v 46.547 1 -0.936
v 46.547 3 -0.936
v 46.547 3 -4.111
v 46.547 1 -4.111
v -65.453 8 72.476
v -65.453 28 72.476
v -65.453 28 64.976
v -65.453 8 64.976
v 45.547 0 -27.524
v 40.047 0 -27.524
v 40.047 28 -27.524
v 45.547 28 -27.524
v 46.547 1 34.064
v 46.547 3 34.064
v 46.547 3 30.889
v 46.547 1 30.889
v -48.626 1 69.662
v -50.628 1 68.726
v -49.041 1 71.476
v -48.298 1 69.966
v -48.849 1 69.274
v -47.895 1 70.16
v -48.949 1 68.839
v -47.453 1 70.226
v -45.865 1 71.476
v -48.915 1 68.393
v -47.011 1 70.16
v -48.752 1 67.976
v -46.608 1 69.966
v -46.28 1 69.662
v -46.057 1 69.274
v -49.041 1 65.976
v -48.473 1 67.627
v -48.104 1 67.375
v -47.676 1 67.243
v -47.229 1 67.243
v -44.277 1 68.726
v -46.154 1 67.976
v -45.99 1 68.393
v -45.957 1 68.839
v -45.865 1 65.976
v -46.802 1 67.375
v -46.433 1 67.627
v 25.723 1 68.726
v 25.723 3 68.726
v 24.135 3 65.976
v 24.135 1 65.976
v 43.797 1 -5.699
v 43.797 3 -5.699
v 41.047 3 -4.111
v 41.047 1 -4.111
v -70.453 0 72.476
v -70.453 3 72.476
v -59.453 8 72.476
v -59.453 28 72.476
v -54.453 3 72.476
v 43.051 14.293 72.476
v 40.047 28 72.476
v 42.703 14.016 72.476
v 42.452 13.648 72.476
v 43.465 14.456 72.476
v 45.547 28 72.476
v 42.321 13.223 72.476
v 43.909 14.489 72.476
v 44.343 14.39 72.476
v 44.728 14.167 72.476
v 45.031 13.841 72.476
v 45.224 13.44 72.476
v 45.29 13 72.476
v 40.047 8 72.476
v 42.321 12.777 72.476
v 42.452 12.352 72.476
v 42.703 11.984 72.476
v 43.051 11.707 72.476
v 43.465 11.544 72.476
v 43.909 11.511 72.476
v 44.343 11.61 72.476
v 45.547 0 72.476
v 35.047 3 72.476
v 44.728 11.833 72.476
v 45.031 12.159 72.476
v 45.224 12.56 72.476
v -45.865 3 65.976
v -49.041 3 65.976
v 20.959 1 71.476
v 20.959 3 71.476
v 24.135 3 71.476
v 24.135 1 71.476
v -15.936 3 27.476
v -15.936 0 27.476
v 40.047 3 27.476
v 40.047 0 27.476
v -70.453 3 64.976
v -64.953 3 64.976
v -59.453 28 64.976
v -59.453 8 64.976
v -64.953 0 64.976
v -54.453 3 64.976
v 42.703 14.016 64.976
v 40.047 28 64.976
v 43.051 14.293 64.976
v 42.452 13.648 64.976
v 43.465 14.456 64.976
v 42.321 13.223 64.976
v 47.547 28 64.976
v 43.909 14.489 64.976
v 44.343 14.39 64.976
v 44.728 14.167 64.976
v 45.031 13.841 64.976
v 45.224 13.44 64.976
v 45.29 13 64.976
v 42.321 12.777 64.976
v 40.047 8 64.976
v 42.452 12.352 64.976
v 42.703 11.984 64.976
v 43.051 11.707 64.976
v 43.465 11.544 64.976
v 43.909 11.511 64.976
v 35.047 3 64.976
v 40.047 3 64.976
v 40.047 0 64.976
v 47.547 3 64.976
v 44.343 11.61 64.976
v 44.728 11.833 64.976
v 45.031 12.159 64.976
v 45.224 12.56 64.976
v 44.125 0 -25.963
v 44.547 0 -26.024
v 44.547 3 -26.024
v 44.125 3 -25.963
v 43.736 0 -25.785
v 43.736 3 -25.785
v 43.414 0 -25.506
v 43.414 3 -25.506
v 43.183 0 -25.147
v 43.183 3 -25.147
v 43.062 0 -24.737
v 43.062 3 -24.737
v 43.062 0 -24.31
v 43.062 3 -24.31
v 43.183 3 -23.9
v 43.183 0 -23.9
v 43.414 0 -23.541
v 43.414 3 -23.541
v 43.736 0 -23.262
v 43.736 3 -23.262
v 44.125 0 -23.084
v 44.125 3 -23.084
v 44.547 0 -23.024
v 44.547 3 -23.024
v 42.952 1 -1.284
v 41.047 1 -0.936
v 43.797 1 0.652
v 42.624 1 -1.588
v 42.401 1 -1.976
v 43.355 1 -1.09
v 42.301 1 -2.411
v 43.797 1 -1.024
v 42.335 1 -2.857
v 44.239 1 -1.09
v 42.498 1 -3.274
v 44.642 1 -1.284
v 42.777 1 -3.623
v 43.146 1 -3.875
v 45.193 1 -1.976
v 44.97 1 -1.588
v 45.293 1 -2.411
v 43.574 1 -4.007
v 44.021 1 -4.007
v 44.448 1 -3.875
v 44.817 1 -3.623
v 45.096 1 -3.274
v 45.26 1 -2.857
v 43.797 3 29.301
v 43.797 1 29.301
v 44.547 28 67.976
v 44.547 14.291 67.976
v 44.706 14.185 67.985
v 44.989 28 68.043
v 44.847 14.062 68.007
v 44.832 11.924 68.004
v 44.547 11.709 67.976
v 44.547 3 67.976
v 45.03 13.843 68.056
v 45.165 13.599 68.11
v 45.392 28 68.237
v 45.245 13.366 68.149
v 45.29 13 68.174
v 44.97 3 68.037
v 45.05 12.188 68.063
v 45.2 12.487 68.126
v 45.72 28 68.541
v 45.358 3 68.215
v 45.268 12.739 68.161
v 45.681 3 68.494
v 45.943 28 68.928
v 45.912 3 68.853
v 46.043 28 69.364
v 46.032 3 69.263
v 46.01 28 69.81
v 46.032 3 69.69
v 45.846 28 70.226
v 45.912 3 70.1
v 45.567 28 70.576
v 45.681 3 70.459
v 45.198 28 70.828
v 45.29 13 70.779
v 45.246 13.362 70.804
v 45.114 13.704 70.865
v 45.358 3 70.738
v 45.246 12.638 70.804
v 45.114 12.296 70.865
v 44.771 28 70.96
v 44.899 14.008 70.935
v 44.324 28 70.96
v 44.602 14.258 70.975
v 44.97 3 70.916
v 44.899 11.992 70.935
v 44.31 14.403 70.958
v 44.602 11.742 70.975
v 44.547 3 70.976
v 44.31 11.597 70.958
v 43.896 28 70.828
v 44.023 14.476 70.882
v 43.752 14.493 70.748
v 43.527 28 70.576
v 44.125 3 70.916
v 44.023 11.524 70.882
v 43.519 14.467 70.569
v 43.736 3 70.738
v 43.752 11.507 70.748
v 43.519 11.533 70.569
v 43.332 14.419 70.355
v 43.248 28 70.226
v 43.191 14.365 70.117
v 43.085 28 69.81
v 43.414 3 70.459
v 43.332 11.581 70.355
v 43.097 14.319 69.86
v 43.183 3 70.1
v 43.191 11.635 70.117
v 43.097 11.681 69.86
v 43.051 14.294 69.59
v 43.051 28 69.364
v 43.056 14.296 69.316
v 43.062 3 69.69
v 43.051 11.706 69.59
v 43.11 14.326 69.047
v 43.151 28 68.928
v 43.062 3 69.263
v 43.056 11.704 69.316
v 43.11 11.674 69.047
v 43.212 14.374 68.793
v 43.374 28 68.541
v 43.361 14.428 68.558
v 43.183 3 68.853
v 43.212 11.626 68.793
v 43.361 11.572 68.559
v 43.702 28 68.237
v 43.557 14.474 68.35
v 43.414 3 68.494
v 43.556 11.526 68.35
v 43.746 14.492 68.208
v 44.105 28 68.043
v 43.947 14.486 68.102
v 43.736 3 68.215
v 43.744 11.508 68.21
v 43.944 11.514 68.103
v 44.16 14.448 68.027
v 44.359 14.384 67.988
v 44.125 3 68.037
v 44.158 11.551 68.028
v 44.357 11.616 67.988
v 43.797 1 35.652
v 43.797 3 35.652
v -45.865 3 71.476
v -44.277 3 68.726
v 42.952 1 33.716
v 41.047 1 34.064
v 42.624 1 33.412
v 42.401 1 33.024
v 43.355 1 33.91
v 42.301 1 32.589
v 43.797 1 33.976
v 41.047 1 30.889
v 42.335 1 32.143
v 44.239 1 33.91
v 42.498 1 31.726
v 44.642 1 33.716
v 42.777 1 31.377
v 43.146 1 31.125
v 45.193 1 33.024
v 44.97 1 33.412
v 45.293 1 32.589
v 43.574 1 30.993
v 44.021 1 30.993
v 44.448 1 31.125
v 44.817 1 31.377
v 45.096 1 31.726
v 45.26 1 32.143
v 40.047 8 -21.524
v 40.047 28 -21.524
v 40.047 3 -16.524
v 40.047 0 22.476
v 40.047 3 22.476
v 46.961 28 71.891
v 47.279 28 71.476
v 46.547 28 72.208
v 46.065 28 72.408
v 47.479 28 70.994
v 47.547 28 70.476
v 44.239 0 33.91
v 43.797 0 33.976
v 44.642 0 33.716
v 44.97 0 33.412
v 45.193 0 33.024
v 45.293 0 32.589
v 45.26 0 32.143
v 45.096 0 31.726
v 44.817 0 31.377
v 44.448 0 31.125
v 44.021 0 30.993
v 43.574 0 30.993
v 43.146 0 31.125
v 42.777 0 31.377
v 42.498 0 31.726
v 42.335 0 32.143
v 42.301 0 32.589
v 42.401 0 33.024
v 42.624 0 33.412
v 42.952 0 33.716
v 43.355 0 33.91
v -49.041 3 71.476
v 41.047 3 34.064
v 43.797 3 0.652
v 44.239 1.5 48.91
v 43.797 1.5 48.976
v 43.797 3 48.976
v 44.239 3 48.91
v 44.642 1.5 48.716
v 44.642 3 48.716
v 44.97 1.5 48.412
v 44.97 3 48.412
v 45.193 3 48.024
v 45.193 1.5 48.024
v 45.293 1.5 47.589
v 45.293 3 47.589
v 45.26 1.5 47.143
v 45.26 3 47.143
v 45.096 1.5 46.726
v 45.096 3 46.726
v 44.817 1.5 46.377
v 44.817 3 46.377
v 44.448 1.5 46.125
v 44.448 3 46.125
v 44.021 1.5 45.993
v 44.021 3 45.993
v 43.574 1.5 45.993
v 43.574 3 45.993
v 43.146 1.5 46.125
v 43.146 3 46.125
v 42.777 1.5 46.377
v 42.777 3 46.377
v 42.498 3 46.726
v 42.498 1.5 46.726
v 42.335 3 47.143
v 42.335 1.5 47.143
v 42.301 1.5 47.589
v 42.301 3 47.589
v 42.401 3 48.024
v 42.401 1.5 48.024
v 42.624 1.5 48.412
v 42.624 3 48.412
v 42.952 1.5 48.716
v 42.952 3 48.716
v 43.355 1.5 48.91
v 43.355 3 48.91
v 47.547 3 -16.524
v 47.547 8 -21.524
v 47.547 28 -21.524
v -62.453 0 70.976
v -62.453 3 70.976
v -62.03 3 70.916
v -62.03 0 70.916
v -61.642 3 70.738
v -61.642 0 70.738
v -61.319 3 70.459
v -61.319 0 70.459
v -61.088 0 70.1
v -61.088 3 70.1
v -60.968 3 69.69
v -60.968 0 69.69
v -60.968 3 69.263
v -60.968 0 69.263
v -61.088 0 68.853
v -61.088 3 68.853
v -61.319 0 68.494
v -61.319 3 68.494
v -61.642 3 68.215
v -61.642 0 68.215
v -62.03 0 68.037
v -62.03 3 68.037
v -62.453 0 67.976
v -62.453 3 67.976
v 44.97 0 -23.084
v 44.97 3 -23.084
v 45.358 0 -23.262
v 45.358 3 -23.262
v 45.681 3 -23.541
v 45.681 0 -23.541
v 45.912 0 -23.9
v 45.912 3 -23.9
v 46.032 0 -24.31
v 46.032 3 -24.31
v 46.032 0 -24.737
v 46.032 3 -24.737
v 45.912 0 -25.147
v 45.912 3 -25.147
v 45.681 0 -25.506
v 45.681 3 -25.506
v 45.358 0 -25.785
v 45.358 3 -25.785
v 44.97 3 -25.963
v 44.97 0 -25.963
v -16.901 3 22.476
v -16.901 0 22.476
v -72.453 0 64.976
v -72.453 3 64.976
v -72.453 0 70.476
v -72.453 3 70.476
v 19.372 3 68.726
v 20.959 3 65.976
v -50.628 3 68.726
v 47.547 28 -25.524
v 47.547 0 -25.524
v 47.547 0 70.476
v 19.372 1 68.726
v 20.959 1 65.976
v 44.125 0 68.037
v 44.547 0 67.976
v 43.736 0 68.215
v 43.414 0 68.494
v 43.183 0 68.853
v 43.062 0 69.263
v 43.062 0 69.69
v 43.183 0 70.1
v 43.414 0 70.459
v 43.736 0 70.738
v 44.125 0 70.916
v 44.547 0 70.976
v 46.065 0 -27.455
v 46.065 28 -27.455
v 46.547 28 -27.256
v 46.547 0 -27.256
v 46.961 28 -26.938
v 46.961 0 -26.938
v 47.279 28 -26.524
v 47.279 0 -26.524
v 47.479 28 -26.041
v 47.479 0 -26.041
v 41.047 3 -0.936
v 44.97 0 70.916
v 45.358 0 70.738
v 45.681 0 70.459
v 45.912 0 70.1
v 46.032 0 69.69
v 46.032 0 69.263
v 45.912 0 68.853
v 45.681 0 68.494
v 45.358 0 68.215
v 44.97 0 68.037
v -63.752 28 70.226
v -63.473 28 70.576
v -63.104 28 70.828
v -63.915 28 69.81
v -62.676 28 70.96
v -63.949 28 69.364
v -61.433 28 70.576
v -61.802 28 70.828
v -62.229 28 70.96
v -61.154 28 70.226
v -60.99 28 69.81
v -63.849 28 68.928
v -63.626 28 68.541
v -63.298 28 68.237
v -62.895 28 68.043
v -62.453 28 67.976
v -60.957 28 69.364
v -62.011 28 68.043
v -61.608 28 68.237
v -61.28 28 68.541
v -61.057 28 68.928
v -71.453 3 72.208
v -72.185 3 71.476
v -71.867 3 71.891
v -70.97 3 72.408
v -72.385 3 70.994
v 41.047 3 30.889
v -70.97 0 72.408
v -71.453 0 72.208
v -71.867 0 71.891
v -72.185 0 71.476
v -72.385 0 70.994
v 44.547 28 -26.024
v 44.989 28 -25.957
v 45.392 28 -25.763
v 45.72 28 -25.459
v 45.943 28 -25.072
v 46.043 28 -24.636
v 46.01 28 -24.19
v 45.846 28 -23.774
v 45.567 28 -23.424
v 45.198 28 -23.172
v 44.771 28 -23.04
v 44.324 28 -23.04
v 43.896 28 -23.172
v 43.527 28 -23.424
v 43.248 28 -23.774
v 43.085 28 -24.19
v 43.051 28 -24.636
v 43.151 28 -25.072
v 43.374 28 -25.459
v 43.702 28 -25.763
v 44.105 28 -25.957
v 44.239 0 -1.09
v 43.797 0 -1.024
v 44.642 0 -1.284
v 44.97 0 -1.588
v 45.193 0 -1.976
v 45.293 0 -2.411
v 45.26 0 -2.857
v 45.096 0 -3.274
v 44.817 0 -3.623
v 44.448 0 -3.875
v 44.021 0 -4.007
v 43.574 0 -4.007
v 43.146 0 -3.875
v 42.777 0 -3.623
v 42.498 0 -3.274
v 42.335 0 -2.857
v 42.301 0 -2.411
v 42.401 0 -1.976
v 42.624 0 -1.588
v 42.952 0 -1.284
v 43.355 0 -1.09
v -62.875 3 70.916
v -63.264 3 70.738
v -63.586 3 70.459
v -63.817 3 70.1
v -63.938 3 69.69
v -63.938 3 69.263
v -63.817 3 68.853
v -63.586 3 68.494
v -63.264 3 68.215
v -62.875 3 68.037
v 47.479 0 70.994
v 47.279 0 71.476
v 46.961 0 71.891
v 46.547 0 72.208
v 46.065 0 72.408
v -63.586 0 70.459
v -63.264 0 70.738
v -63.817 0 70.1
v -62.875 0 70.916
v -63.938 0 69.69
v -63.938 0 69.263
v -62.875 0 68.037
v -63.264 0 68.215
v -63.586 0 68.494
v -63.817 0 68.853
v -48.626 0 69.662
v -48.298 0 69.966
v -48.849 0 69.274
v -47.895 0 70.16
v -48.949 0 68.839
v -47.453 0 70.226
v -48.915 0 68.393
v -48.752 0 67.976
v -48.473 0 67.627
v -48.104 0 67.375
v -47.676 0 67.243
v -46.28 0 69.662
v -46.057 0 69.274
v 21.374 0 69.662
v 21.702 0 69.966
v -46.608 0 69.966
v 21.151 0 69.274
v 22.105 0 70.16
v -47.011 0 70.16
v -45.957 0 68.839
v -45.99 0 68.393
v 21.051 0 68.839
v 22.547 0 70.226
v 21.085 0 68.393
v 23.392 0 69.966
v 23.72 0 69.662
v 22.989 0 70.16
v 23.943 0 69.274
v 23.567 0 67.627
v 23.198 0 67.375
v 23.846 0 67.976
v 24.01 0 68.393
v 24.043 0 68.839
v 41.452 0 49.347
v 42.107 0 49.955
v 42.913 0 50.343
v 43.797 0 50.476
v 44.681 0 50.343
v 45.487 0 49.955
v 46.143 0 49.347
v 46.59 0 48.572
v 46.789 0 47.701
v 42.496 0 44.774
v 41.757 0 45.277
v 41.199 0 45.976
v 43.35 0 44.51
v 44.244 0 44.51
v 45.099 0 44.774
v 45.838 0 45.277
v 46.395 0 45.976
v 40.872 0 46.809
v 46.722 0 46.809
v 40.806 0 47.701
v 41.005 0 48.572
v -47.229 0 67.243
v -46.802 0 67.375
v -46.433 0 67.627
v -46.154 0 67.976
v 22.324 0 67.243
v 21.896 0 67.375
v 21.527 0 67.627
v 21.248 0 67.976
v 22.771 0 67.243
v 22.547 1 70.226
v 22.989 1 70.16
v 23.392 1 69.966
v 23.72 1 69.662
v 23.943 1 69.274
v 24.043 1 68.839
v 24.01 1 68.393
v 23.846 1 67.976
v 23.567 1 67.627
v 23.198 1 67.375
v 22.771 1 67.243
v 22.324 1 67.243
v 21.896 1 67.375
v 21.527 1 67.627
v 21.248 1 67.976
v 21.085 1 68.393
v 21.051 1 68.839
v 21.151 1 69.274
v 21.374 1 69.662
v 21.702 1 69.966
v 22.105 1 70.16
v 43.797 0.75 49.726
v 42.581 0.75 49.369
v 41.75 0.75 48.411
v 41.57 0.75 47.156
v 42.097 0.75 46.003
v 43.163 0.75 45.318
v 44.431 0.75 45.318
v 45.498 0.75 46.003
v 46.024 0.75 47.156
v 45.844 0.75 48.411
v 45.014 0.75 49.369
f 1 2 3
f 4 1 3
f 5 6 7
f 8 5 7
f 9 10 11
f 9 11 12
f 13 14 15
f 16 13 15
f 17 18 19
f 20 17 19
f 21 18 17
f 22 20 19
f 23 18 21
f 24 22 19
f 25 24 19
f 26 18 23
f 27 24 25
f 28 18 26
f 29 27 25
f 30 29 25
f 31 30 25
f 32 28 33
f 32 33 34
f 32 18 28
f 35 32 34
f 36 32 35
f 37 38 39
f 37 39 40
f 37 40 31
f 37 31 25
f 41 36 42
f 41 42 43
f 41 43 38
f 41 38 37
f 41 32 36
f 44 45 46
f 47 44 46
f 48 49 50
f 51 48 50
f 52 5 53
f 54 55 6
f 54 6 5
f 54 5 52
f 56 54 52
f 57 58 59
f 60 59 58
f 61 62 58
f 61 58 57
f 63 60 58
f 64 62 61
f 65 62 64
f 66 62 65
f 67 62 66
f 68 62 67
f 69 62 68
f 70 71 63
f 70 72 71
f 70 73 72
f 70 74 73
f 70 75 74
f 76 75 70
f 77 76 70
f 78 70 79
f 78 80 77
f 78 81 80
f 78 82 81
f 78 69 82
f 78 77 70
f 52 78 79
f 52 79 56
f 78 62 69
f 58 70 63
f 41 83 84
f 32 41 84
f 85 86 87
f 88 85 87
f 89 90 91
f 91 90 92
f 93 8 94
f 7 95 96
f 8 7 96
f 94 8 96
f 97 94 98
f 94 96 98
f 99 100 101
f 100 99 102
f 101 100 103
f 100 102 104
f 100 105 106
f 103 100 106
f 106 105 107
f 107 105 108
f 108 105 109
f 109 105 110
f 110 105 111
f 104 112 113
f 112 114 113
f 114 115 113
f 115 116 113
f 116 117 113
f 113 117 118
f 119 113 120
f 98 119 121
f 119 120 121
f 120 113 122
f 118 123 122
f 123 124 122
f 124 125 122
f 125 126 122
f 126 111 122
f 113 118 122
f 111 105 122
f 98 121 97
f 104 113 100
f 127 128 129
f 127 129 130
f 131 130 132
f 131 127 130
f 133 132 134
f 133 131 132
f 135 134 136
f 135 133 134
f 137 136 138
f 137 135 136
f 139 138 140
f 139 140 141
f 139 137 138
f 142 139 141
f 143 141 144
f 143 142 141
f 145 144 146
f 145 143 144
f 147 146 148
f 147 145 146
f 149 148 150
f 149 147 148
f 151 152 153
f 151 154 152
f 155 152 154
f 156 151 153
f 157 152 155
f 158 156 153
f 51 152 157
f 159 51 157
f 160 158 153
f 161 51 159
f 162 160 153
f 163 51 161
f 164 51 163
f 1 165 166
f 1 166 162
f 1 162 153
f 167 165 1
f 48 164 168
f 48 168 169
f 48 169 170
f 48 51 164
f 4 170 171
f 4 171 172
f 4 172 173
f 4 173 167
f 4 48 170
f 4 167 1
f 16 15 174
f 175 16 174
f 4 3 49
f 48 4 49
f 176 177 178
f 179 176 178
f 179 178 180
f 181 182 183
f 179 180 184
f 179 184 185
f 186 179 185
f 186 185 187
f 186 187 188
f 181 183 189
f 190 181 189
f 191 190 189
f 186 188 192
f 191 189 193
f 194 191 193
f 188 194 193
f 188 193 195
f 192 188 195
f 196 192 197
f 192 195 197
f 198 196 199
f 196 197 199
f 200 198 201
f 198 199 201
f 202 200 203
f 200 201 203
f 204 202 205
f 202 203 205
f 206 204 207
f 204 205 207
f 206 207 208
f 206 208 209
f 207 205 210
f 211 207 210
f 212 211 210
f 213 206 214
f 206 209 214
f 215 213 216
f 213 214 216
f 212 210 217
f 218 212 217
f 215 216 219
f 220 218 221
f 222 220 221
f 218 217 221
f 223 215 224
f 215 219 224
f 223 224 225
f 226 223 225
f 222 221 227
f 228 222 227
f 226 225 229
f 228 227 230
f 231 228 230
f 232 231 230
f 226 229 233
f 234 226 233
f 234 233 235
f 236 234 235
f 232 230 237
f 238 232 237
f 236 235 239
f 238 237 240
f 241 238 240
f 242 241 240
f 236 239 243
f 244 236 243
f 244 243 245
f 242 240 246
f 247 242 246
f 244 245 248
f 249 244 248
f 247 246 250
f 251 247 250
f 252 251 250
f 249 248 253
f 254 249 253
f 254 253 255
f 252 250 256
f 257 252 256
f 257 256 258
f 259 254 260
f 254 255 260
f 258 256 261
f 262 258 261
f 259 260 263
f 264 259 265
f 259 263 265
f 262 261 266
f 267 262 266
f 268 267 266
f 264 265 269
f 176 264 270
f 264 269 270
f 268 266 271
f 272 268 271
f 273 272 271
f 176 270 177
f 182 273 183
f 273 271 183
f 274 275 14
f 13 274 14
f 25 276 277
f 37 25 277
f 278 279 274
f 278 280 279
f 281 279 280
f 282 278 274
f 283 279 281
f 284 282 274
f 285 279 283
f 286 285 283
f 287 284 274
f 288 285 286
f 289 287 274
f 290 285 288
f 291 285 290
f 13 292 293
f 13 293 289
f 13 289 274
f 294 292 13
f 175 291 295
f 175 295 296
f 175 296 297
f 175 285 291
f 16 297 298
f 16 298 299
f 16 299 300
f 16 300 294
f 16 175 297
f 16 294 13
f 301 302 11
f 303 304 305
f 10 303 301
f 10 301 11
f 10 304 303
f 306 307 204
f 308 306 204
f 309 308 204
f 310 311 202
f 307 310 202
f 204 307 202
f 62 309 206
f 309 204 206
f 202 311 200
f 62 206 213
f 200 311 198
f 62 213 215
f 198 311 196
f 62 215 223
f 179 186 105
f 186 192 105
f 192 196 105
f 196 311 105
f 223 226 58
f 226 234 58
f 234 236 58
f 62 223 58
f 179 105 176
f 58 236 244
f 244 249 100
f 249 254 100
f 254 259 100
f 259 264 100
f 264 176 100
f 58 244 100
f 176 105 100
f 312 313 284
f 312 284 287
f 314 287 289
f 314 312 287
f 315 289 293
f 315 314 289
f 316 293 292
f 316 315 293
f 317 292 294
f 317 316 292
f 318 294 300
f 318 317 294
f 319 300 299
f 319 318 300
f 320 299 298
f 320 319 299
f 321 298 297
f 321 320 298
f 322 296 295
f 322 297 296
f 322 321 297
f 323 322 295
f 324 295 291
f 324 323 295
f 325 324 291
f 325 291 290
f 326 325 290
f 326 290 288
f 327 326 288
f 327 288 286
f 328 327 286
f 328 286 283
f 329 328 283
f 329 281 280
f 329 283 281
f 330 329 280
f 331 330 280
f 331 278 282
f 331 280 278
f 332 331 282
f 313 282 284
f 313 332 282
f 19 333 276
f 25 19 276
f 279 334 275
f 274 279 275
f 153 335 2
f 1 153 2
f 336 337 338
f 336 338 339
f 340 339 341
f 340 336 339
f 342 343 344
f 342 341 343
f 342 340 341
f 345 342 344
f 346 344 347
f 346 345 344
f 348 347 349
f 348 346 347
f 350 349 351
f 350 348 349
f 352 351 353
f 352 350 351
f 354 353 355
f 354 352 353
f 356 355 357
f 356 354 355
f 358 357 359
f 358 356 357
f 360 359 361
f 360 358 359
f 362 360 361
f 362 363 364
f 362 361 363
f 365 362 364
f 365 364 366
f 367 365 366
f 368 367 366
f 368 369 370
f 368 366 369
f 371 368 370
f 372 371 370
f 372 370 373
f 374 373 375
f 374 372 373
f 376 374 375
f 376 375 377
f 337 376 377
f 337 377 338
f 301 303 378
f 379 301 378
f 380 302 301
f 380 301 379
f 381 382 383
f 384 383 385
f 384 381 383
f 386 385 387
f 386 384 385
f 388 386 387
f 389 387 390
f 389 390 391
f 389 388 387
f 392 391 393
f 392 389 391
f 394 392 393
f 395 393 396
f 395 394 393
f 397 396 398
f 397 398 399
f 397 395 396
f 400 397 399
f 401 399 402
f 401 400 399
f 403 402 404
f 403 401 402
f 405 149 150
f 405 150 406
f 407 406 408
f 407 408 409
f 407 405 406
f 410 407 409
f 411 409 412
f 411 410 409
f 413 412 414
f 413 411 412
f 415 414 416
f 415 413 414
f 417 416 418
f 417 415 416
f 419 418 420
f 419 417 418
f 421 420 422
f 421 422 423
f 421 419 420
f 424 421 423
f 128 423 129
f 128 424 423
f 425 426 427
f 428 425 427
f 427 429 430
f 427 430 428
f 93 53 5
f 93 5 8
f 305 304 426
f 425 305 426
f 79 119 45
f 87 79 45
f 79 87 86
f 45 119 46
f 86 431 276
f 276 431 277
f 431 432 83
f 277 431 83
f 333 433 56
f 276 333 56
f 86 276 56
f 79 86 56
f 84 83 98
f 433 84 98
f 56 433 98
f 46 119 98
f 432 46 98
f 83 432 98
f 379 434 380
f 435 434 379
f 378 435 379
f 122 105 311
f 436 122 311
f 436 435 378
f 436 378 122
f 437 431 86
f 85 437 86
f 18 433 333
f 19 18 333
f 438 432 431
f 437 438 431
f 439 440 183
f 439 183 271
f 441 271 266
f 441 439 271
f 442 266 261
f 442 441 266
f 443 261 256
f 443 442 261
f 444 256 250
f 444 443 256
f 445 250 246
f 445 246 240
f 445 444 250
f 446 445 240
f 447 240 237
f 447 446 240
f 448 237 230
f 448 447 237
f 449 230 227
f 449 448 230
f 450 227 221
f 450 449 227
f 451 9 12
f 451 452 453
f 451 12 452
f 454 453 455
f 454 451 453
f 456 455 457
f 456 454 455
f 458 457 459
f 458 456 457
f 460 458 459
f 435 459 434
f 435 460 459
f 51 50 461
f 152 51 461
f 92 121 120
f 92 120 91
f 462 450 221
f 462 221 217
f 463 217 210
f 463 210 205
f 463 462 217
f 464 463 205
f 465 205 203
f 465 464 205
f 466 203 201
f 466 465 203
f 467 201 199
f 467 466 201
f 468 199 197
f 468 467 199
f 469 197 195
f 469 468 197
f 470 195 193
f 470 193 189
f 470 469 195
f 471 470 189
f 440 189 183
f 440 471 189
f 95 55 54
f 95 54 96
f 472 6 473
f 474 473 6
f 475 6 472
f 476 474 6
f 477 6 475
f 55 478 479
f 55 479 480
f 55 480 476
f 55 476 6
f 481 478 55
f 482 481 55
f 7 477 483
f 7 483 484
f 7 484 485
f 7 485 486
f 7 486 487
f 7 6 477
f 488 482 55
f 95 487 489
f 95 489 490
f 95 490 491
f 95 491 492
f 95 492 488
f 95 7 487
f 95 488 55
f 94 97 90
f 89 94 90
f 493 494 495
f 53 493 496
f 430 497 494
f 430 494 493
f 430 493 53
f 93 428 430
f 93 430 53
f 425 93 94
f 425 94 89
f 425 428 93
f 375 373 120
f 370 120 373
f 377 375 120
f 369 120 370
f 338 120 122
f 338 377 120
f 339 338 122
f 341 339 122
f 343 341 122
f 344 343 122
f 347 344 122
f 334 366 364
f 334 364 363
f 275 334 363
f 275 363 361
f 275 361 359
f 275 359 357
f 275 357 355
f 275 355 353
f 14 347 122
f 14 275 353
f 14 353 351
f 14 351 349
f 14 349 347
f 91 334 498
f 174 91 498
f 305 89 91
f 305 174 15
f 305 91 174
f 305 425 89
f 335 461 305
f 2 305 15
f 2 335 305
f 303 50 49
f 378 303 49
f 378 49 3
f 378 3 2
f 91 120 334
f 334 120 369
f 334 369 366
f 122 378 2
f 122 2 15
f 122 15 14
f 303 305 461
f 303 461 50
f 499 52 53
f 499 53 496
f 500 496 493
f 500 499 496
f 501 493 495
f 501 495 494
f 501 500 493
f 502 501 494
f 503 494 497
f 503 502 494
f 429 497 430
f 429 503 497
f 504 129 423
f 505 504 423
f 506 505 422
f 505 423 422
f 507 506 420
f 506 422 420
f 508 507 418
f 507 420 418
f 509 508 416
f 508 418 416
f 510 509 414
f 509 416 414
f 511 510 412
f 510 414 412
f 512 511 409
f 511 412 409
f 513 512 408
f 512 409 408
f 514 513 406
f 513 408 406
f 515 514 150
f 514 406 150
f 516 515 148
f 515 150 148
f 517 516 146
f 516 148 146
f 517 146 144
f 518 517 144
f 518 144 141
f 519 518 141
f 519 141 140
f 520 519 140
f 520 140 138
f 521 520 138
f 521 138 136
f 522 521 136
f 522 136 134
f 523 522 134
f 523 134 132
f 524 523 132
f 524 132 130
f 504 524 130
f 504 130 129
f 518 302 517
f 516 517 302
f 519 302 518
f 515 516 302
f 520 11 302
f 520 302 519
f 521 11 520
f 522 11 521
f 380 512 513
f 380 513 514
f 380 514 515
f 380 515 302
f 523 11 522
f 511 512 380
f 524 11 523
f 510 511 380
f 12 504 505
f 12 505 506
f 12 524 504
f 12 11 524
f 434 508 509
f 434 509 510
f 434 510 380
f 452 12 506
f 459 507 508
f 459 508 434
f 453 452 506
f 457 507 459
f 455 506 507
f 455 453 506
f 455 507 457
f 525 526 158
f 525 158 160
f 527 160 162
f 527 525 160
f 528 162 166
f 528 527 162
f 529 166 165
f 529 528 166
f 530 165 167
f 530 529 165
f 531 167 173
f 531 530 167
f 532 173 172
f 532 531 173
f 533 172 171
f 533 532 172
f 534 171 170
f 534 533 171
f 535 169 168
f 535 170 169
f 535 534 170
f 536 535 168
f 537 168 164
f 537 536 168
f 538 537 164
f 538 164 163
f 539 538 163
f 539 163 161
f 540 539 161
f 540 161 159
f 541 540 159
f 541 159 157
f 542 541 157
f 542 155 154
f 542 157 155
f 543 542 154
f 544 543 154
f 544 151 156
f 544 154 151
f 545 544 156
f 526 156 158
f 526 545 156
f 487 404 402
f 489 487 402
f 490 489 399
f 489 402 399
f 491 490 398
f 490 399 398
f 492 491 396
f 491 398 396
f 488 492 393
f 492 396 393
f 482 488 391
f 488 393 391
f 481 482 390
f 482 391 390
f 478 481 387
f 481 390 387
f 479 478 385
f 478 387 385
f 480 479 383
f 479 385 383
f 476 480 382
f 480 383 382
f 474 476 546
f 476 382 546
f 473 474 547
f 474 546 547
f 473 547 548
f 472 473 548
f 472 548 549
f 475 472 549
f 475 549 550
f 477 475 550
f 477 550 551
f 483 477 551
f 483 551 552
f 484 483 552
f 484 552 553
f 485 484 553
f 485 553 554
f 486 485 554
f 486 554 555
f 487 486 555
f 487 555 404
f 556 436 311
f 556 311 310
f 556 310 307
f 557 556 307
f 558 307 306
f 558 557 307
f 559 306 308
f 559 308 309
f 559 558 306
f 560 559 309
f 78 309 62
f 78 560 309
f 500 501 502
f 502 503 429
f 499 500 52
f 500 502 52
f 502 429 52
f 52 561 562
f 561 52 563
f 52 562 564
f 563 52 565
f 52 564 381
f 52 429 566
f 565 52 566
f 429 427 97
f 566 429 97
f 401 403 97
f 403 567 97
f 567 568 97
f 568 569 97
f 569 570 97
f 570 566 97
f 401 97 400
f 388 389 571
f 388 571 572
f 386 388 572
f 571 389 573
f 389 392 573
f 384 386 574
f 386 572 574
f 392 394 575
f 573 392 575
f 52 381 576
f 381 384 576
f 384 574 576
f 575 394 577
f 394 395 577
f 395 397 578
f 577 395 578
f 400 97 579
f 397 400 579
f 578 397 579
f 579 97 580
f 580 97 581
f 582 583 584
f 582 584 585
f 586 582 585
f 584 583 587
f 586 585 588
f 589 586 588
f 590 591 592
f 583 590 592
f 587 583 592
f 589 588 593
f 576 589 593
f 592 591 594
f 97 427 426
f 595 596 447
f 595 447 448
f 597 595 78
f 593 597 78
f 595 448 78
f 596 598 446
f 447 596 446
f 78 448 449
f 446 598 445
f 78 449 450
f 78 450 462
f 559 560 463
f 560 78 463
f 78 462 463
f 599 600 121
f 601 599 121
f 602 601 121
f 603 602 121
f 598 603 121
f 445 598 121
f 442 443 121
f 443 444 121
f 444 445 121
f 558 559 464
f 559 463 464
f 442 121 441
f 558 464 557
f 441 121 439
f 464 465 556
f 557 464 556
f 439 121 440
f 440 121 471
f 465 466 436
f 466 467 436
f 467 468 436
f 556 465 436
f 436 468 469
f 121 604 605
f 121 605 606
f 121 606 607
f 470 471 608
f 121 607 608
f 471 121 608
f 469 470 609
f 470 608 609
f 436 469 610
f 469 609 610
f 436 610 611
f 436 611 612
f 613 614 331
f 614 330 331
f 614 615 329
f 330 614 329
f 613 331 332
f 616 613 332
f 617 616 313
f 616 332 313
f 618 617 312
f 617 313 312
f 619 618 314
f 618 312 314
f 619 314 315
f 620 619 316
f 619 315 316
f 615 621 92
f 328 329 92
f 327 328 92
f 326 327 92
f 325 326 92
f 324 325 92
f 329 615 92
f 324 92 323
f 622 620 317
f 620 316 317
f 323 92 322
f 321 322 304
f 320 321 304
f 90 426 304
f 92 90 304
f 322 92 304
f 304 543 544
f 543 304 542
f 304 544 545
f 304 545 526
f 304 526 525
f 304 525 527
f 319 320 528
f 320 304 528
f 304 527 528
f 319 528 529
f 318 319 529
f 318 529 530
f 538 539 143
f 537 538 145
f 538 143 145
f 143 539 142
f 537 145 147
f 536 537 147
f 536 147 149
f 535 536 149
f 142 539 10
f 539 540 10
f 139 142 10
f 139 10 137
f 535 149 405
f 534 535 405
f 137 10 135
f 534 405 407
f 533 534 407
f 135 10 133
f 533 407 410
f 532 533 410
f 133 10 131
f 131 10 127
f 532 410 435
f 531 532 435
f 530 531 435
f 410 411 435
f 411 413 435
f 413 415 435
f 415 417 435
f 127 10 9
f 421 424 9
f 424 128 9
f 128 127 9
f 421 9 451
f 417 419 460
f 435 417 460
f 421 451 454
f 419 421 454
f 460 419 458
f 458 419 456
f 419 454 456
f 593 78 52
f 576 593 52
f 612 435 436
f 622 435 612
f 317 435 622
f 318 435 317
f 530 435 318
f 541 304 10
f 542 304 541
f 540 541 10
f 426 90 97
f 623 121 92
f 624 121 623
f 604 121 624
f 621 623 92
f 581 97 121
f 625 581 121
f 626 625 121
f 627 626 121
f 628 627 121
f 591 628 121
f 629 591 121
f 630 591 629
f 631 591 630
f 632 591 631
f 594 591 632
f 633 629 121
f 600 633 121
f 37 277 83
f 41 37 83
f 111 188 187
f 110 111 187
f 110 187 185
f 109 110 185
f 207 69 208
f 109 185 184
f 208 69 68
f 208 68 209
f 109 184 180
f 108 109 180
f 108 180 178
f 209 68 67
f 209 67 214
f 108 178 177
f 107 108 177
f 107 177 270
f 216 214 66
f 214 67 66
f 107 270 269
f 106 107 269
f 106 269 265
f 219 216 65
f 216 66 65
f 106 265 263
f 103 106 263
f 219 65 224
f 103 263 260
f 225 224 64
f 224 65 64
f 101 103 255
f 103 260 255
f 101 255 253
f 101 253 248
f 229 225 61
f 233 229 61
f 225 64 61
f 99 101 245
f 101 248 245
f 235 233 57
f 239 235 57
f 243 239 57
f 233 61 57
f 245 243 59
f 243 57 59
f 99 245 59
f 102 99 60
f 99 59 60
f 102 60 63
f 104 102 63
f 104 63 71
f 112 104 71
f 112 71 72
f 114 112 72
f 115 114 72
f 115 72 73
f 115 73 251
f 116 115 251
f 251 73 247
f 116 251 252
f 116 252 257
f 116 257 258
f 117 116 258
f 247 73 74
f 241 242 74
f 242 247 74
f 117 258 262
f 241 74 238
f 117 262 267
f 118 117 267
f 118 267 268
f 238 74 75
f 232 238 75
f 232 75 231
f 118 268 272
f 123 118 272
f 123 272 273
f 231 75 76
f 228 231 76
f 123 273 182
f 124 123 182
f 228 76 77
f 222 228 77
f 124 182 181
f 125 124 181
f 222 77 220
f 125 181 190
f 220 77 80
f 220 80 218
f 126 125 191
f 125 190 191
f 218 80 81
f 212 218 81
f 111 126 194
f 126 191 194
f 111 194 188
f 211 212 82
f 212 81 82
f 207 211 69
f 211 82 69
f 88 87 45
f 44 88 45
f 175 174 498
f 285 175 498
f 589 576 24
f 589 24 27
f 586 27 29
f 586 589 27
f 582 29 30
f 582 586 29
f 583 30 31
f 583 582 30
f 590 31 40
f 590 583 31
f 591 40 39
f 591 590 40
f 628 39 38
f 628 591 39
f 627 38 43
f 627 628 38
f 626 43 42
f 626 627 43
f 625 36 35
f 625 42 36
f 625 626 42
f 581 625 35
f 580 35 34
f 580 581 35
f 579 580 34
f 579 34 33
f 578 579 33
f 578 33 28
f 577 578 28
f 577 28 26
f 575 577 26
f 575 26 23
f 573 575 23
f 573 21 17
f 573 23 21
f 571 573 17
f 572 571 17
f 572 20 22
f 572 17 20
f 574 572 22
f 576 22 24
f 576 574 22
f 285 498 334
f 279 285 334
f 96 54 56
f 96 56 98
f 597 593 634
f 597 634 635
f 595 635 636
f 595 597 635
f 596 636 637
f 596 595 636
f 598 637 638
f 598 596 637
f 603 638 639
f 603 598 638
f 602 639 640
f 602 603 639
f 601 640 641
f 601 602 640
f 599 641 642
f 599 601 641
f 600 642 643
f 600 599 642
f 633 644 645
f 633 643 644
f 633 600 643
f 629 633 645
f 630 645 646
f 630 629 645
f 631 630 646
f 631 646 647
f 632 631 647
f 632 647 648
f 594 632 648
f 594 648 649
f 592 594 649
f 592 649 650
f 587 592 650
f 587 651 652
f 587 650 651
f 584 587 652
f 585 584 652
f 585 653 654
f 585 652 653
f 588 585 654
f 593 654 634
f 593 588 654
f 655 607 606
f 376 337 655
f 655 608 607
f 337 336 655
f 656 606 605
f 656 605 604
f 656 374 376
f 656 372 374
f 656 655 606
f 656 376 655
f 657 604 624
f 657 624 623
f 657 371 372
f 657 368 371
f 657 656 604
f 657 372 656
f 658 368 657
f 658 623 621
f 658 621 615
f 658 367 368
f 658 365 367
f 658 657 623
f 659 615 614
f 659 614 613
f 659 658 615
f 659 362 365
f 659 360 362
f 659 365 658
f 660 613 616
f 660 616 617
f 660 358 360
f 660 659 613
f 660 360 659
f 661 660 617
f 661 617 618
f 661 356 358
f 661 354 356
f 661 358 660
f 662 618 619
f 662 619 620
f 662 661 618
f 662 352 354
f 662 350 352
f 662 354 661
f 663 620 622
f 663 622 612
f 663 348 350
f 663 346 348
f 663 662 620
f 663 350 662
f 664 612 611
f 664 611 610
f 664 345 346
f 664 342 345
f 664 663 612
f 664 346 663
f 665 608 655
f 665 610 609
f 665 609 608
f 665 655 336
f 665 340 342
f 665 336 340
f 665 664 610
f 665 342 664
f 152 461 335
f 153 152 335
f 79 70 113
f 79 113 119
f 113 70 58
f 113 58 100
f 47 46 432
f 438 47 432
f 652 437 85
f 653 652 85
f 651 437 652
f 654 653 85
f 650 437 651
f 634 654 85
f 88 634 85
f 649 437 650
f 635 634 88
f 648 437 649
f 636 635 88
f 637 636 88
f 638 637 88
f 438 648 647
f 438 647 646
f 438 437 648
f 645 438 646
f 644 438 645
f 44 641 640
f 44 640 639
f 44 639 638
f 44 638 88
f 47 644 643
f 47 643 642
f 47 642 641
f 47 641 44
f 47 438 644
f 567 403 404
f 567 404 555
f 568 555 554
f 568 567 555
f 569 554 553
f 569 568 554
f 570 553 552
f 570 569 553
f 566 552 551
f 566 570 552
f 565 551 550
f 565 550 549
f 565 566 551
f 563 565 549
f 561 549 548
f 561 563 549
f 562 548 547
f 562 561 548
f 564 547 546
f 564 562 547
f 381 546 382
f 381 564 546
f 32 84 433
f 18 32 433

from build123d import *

# Parameters (mm, degrees)
SKETCH1_R               = 1.5
BOSS_EXTRUDE1_DEPTH     = 3
SKETCH2_W               = 6
SKETCH2_H               = 7.5
BOSS_EXTRUDE2_DEPTH     = 25
CHAMFER3_SIZE           = 5
CHAMFER6_SIZE           = 5
CHAMFER8_SIZE           = 5
SKETCH3_R               = 1.5
CUT_EXTRUDE1_DEPTH      = 107.236732571
BOSS_EXTRUDE3_DEPTH     = 3
CUT_EXTRUDE2_DEPTH      = 2
CUT_EXTRUDE3_DEPTH      = 10
CUT_EXTRUDE3_DEPTH_BACK = 106.977560584
SKETCH6_R               = 1.5
SKETCH9_R               = 1.493282486
CUT_EXTRUDE4_DEPTH      = 10
CHAMFER9_SIZE           = 1.5


with BuildPart() as part:
    # Sketch1 → Boss-Extrude1 (new body)
    with BuildSketch(Plane(origin=(0, 0, 0), x_dir=(1, 0, 0), z_dir=(0, 1, 0))):
        with BuildLine():
            Line((40.047169811, 27.523584906), (44.547169811, 27.523584906))
            Line((44.547169811, 27.523584906), (45.547169811, 27.523584906))
            ThreePointArc((45.547169811, 27.523584906), (46.961383374, 26.937798468), (47.547169811, 25.523584906))
            Line((47.547169811, 25.523584906), (47.547169811, 24.523584906))
            Line((47.547169811, 24.523584906), (47.547169811, -70.476415094))
            ThreePointArc((47.547169811, -70.476415094), (46.961383374, -71.890628657), (45.547169811, -72.476415094))
            Line((45.547169811, -72.476415094), (-69.452830189, -72.476415094))
            Line((-69.452830189, -72.476415094), (-70.452830189, -72.476415094))
            ThreePointArc((-70.452830189, -72.476415094), (-71.867043751, -71.890628657), (-72.452830189, -70.476415094))
            Line((-72.452830189, -70.476415094), (-72.452830189, -69.476415094))
            Line((-72.452830189, -69.476415094), (-72.452830189, -64.976415094))
            Line((-72.452830189, -64.976415094), (40.047169811, -64.976415094))
            Line((40.047169811, -64.976415094), (40.047169811, 27.523584906))
        make_face()
        with Locations(Location((44.547169811, 24.523584906, 0), (0, 0, 270))):
            Circle(SKETCH1_R, mode=Mode.SUBTRACT)
        with Locations(Location((44.547169811, -69.476415094, 0), (0, 0, 270))):
            Circle(SKETCH1_R, mode=Mode.SUBTRACT)
        with Locations(Location((-62.452830189, -69.476415094, 0), (0, 0, 270))):
            Circle(SKETCH1_R, mode=Mode.SUBTRACT)
    extrude(amount=BOSS_EXTRUDE1_DEPTH)

    # Sketch2 → Boss-Extrude2 (add)
    with BuildSketch(Plane(origin=(0, 3, 0), x_dir=(1, 0, 0), z_dir=(0, 1, 0))):
        with BuildLine():
            Line((40.047169811, -64.976415094), (47.547169811, -64.976415094))
            Line((47.547169811, -64.976415094), (47.547169811, -70.476415094))
            ThreePointArc((47.547169811, -70.476415094), (46.961383374, -71.890628657), (45.547169811, -72.476415094))
            Line((45.547169811, -72.476415094), (40.047169811, -72.476415094))
            Line((40.047169811, -72.476415094), (40.047169811, -64.976415094))
        make_face()
        with Locations((-62.452830189, -68.726415094)):
            Rectangle(SKETCH2_W, SKETCH2_H)
        with BuildLine():
            Line((40.047169811, 21.523584906), (47.547169811, 21.523584906))
            Line((47.547169811, 21.523584906), (47.547169811, 25.523584906))
            ThreePointArc((47.547169811, 25.523584906), (46.961383374, 26.937798468), (45.547169811, 27.523584906))
            Line((45.547169811, 27.523584906), (40.047169811, 27.523584906))
            Line((40.047169811, 27.523584906), (40.047169811, 21.523584906))
        make_face()
    extrude(amount=BOSS_EXTRUDE2_DEPTH)

    # Chamfer3
    chamfer3_edges = [part.edges().sort_by_distance(p)[0] for p in [
        (43.797169811, 3, -21.523584906),
    ]]
    chamfer(chamfer3_edges, length=CHAMFER3_SIZE)

    # Chamfer6
    # the kernel refuses this chamfer: 5 mm, written as the material it adds along each edge
    with BuildSketch(Plane(origin=(40.047169811, 3, 72.476415094), x_dir=(0.027495876610586317, 0.9996219169112968, 0), z_dir=(0, 0, -1))) as chamfer6_piece_1:
        Polygon((CHAMFER6_SIZE * 0.999621916911, -CHAMFER6_SIZE * 0.0274958766106), (-CHAMFER6_SIZE * 0.0274958766106, -CHAMFER6_SIZE * 0.999621916911), (0, 0), align=None)
    extrude(amount=7.5)

    # Chamfer8
    chamfer8_edges = [part.edges().sort_by_distance(p)[0] for p in [
        (-65.452830189, 3, 68.726415094),
        (-59.452830189, 3, 68.726415094),
    ]]
    chamfer(chamfer8_edges, length=CHAMFER8_SIZE)

    # Sketch3 → Cut-Extrude1 (cut, through all)
    with BuildSketch(Plane(origin=(0, 0, 0), x_dir=(-1, 0, 0), z_dir=(0, -1, 0))):
        with Locations(Location((62.452830189, -69.476415094, 0), (0, 0, 90))):
            Circle(SKETCH3_R)
        with Locations(Location((-44.547169811, -69.476415094, 0), (0, 0, 90))):
            Circle(SKETCH3_R)
        with Locations(Location((-44.547169811, 24.523584906, 0), (0, 0, 90))):
            Circle(SKETCH3_R)
    extrude(amount=-CUT_EXTRUDE1_DEPTH, mode=Mode.SUBTRACT)

    # Sketch4 → Boss-Extrude3 (add)
    with BuildSketch(Plane(origin=(0, 0, 0), x_dir=(-1, 0, 0), z_dir=(0, -1, 0))):
        Polygon((-40.047169811, -22.476415094), (16.900565623, -22.476415094), (72.452830189, -64.976415094), (64.952830189, -64.976415094), (15.93612616, -27.476415094), (-40.047169811, -27.476415094), align=None)
    extrude(amount=-BOSS_EXTRUDE3_DEPTH)

    # Sketch5 → Cut-Extrude2 (cut)
    with BuildSketch(Plane(origin=(0, 3, 0), x_dir=(1, 0, 0), z_dir=(0, 1, 0))):
        Polygon((-44.277403708, -68.726415094), (-45.865116948, -65.976415094), (-49.040543429, -65.976415094), (-50.628256669, -68.726415094), (-49.040543429, -71.476415094), (-45.865116948, -71.476415094), align=None)
        Polygon((25.722596292, -68.726415094), (24.134883052, -65.976415094), (20.959456571, -65.976415094), (19.371743331, -68.726415094), (20.959456571, -71.476415094), (24.134883052, -71.476415094), align=None)
        Polygon((43.797169811, -0.651841575), (46.547169811, 0.935871665), (46.547169811, 4.111298146), (43.797169811, 5.699011386), (41.047169811, 4.111298146), (41.047169811, 0.935871665), align=None)
        Polygon((43.797169811, -35.651841575), (46.547169811, -34.064128335), (46.547169811, -30.888701854), (43.797169811, -29.300988614), (41.047169811, -30.888701854), (41.047169811, -34.064128335), align=None)
    extrude(amount=-CUT_EXTRUDE2_DEPTH, mode=Mode.SUBTRACT)

    # Sketch6 → Cut-Extrude3 (cut, two sides: drawn at the far end of the back side and taken through both)
    with BuildSketch(Plane(origin=(0, 1, 0), x_dir=(1, 0, 0), z_dir=(0, 1, 0)).offset(-CUT_EXTRUDE3_DEPTH_BACK)):
        with Locations(Location((43.797169811, 2.523584906, 0), (0, 0, 270))):
            Circle(SKETCH6_R)
        with Locations(Location((43.797169811, -32.476415094, 0), (0, 0, 270))):
            Circle(SKETCH6_R)
        with Locations(Location((22.547169811, -68.726415094, 0), (0, 0, 270))):
            Circle(SKETCH6_R)
        with Locations(Location((-47.452830189, -68.726415094, 0), (0, 0, 270))):
            Circle(SKETCH6_R)
        with Locations(Location((43.797169811, -47.476415094, 0), (0, 0, 270))):
            Circle(SKETCH6_R)
    extrude(amount=CUT_EXTRUDE3_DEPTH + CUT_EXTRUDE3_DEPTH_BACK, mode=Mode.SUBTRACT)

    # Sketch9 → Cut-Extrude4 (cut)
    with BuildSketch(Plane.XY.offset(72.476415094)):
        with Locations((43.797169811, 13)):
            Circle(SKETCH9_R)
    extrude(amount=-CUT_EXTRUDE4_DEPTH, mode=Mode.SUBTRACT)

    # Chamfer9
    chamfer9_edges = [part.edges().sort_by_distance(p)[0] for p in [
        (43.797169811, 0, 45.976415094),
    ]]
    chamfer(chamfer9_edges, length=CHAMFER9_SIZE)


solid = part.part
